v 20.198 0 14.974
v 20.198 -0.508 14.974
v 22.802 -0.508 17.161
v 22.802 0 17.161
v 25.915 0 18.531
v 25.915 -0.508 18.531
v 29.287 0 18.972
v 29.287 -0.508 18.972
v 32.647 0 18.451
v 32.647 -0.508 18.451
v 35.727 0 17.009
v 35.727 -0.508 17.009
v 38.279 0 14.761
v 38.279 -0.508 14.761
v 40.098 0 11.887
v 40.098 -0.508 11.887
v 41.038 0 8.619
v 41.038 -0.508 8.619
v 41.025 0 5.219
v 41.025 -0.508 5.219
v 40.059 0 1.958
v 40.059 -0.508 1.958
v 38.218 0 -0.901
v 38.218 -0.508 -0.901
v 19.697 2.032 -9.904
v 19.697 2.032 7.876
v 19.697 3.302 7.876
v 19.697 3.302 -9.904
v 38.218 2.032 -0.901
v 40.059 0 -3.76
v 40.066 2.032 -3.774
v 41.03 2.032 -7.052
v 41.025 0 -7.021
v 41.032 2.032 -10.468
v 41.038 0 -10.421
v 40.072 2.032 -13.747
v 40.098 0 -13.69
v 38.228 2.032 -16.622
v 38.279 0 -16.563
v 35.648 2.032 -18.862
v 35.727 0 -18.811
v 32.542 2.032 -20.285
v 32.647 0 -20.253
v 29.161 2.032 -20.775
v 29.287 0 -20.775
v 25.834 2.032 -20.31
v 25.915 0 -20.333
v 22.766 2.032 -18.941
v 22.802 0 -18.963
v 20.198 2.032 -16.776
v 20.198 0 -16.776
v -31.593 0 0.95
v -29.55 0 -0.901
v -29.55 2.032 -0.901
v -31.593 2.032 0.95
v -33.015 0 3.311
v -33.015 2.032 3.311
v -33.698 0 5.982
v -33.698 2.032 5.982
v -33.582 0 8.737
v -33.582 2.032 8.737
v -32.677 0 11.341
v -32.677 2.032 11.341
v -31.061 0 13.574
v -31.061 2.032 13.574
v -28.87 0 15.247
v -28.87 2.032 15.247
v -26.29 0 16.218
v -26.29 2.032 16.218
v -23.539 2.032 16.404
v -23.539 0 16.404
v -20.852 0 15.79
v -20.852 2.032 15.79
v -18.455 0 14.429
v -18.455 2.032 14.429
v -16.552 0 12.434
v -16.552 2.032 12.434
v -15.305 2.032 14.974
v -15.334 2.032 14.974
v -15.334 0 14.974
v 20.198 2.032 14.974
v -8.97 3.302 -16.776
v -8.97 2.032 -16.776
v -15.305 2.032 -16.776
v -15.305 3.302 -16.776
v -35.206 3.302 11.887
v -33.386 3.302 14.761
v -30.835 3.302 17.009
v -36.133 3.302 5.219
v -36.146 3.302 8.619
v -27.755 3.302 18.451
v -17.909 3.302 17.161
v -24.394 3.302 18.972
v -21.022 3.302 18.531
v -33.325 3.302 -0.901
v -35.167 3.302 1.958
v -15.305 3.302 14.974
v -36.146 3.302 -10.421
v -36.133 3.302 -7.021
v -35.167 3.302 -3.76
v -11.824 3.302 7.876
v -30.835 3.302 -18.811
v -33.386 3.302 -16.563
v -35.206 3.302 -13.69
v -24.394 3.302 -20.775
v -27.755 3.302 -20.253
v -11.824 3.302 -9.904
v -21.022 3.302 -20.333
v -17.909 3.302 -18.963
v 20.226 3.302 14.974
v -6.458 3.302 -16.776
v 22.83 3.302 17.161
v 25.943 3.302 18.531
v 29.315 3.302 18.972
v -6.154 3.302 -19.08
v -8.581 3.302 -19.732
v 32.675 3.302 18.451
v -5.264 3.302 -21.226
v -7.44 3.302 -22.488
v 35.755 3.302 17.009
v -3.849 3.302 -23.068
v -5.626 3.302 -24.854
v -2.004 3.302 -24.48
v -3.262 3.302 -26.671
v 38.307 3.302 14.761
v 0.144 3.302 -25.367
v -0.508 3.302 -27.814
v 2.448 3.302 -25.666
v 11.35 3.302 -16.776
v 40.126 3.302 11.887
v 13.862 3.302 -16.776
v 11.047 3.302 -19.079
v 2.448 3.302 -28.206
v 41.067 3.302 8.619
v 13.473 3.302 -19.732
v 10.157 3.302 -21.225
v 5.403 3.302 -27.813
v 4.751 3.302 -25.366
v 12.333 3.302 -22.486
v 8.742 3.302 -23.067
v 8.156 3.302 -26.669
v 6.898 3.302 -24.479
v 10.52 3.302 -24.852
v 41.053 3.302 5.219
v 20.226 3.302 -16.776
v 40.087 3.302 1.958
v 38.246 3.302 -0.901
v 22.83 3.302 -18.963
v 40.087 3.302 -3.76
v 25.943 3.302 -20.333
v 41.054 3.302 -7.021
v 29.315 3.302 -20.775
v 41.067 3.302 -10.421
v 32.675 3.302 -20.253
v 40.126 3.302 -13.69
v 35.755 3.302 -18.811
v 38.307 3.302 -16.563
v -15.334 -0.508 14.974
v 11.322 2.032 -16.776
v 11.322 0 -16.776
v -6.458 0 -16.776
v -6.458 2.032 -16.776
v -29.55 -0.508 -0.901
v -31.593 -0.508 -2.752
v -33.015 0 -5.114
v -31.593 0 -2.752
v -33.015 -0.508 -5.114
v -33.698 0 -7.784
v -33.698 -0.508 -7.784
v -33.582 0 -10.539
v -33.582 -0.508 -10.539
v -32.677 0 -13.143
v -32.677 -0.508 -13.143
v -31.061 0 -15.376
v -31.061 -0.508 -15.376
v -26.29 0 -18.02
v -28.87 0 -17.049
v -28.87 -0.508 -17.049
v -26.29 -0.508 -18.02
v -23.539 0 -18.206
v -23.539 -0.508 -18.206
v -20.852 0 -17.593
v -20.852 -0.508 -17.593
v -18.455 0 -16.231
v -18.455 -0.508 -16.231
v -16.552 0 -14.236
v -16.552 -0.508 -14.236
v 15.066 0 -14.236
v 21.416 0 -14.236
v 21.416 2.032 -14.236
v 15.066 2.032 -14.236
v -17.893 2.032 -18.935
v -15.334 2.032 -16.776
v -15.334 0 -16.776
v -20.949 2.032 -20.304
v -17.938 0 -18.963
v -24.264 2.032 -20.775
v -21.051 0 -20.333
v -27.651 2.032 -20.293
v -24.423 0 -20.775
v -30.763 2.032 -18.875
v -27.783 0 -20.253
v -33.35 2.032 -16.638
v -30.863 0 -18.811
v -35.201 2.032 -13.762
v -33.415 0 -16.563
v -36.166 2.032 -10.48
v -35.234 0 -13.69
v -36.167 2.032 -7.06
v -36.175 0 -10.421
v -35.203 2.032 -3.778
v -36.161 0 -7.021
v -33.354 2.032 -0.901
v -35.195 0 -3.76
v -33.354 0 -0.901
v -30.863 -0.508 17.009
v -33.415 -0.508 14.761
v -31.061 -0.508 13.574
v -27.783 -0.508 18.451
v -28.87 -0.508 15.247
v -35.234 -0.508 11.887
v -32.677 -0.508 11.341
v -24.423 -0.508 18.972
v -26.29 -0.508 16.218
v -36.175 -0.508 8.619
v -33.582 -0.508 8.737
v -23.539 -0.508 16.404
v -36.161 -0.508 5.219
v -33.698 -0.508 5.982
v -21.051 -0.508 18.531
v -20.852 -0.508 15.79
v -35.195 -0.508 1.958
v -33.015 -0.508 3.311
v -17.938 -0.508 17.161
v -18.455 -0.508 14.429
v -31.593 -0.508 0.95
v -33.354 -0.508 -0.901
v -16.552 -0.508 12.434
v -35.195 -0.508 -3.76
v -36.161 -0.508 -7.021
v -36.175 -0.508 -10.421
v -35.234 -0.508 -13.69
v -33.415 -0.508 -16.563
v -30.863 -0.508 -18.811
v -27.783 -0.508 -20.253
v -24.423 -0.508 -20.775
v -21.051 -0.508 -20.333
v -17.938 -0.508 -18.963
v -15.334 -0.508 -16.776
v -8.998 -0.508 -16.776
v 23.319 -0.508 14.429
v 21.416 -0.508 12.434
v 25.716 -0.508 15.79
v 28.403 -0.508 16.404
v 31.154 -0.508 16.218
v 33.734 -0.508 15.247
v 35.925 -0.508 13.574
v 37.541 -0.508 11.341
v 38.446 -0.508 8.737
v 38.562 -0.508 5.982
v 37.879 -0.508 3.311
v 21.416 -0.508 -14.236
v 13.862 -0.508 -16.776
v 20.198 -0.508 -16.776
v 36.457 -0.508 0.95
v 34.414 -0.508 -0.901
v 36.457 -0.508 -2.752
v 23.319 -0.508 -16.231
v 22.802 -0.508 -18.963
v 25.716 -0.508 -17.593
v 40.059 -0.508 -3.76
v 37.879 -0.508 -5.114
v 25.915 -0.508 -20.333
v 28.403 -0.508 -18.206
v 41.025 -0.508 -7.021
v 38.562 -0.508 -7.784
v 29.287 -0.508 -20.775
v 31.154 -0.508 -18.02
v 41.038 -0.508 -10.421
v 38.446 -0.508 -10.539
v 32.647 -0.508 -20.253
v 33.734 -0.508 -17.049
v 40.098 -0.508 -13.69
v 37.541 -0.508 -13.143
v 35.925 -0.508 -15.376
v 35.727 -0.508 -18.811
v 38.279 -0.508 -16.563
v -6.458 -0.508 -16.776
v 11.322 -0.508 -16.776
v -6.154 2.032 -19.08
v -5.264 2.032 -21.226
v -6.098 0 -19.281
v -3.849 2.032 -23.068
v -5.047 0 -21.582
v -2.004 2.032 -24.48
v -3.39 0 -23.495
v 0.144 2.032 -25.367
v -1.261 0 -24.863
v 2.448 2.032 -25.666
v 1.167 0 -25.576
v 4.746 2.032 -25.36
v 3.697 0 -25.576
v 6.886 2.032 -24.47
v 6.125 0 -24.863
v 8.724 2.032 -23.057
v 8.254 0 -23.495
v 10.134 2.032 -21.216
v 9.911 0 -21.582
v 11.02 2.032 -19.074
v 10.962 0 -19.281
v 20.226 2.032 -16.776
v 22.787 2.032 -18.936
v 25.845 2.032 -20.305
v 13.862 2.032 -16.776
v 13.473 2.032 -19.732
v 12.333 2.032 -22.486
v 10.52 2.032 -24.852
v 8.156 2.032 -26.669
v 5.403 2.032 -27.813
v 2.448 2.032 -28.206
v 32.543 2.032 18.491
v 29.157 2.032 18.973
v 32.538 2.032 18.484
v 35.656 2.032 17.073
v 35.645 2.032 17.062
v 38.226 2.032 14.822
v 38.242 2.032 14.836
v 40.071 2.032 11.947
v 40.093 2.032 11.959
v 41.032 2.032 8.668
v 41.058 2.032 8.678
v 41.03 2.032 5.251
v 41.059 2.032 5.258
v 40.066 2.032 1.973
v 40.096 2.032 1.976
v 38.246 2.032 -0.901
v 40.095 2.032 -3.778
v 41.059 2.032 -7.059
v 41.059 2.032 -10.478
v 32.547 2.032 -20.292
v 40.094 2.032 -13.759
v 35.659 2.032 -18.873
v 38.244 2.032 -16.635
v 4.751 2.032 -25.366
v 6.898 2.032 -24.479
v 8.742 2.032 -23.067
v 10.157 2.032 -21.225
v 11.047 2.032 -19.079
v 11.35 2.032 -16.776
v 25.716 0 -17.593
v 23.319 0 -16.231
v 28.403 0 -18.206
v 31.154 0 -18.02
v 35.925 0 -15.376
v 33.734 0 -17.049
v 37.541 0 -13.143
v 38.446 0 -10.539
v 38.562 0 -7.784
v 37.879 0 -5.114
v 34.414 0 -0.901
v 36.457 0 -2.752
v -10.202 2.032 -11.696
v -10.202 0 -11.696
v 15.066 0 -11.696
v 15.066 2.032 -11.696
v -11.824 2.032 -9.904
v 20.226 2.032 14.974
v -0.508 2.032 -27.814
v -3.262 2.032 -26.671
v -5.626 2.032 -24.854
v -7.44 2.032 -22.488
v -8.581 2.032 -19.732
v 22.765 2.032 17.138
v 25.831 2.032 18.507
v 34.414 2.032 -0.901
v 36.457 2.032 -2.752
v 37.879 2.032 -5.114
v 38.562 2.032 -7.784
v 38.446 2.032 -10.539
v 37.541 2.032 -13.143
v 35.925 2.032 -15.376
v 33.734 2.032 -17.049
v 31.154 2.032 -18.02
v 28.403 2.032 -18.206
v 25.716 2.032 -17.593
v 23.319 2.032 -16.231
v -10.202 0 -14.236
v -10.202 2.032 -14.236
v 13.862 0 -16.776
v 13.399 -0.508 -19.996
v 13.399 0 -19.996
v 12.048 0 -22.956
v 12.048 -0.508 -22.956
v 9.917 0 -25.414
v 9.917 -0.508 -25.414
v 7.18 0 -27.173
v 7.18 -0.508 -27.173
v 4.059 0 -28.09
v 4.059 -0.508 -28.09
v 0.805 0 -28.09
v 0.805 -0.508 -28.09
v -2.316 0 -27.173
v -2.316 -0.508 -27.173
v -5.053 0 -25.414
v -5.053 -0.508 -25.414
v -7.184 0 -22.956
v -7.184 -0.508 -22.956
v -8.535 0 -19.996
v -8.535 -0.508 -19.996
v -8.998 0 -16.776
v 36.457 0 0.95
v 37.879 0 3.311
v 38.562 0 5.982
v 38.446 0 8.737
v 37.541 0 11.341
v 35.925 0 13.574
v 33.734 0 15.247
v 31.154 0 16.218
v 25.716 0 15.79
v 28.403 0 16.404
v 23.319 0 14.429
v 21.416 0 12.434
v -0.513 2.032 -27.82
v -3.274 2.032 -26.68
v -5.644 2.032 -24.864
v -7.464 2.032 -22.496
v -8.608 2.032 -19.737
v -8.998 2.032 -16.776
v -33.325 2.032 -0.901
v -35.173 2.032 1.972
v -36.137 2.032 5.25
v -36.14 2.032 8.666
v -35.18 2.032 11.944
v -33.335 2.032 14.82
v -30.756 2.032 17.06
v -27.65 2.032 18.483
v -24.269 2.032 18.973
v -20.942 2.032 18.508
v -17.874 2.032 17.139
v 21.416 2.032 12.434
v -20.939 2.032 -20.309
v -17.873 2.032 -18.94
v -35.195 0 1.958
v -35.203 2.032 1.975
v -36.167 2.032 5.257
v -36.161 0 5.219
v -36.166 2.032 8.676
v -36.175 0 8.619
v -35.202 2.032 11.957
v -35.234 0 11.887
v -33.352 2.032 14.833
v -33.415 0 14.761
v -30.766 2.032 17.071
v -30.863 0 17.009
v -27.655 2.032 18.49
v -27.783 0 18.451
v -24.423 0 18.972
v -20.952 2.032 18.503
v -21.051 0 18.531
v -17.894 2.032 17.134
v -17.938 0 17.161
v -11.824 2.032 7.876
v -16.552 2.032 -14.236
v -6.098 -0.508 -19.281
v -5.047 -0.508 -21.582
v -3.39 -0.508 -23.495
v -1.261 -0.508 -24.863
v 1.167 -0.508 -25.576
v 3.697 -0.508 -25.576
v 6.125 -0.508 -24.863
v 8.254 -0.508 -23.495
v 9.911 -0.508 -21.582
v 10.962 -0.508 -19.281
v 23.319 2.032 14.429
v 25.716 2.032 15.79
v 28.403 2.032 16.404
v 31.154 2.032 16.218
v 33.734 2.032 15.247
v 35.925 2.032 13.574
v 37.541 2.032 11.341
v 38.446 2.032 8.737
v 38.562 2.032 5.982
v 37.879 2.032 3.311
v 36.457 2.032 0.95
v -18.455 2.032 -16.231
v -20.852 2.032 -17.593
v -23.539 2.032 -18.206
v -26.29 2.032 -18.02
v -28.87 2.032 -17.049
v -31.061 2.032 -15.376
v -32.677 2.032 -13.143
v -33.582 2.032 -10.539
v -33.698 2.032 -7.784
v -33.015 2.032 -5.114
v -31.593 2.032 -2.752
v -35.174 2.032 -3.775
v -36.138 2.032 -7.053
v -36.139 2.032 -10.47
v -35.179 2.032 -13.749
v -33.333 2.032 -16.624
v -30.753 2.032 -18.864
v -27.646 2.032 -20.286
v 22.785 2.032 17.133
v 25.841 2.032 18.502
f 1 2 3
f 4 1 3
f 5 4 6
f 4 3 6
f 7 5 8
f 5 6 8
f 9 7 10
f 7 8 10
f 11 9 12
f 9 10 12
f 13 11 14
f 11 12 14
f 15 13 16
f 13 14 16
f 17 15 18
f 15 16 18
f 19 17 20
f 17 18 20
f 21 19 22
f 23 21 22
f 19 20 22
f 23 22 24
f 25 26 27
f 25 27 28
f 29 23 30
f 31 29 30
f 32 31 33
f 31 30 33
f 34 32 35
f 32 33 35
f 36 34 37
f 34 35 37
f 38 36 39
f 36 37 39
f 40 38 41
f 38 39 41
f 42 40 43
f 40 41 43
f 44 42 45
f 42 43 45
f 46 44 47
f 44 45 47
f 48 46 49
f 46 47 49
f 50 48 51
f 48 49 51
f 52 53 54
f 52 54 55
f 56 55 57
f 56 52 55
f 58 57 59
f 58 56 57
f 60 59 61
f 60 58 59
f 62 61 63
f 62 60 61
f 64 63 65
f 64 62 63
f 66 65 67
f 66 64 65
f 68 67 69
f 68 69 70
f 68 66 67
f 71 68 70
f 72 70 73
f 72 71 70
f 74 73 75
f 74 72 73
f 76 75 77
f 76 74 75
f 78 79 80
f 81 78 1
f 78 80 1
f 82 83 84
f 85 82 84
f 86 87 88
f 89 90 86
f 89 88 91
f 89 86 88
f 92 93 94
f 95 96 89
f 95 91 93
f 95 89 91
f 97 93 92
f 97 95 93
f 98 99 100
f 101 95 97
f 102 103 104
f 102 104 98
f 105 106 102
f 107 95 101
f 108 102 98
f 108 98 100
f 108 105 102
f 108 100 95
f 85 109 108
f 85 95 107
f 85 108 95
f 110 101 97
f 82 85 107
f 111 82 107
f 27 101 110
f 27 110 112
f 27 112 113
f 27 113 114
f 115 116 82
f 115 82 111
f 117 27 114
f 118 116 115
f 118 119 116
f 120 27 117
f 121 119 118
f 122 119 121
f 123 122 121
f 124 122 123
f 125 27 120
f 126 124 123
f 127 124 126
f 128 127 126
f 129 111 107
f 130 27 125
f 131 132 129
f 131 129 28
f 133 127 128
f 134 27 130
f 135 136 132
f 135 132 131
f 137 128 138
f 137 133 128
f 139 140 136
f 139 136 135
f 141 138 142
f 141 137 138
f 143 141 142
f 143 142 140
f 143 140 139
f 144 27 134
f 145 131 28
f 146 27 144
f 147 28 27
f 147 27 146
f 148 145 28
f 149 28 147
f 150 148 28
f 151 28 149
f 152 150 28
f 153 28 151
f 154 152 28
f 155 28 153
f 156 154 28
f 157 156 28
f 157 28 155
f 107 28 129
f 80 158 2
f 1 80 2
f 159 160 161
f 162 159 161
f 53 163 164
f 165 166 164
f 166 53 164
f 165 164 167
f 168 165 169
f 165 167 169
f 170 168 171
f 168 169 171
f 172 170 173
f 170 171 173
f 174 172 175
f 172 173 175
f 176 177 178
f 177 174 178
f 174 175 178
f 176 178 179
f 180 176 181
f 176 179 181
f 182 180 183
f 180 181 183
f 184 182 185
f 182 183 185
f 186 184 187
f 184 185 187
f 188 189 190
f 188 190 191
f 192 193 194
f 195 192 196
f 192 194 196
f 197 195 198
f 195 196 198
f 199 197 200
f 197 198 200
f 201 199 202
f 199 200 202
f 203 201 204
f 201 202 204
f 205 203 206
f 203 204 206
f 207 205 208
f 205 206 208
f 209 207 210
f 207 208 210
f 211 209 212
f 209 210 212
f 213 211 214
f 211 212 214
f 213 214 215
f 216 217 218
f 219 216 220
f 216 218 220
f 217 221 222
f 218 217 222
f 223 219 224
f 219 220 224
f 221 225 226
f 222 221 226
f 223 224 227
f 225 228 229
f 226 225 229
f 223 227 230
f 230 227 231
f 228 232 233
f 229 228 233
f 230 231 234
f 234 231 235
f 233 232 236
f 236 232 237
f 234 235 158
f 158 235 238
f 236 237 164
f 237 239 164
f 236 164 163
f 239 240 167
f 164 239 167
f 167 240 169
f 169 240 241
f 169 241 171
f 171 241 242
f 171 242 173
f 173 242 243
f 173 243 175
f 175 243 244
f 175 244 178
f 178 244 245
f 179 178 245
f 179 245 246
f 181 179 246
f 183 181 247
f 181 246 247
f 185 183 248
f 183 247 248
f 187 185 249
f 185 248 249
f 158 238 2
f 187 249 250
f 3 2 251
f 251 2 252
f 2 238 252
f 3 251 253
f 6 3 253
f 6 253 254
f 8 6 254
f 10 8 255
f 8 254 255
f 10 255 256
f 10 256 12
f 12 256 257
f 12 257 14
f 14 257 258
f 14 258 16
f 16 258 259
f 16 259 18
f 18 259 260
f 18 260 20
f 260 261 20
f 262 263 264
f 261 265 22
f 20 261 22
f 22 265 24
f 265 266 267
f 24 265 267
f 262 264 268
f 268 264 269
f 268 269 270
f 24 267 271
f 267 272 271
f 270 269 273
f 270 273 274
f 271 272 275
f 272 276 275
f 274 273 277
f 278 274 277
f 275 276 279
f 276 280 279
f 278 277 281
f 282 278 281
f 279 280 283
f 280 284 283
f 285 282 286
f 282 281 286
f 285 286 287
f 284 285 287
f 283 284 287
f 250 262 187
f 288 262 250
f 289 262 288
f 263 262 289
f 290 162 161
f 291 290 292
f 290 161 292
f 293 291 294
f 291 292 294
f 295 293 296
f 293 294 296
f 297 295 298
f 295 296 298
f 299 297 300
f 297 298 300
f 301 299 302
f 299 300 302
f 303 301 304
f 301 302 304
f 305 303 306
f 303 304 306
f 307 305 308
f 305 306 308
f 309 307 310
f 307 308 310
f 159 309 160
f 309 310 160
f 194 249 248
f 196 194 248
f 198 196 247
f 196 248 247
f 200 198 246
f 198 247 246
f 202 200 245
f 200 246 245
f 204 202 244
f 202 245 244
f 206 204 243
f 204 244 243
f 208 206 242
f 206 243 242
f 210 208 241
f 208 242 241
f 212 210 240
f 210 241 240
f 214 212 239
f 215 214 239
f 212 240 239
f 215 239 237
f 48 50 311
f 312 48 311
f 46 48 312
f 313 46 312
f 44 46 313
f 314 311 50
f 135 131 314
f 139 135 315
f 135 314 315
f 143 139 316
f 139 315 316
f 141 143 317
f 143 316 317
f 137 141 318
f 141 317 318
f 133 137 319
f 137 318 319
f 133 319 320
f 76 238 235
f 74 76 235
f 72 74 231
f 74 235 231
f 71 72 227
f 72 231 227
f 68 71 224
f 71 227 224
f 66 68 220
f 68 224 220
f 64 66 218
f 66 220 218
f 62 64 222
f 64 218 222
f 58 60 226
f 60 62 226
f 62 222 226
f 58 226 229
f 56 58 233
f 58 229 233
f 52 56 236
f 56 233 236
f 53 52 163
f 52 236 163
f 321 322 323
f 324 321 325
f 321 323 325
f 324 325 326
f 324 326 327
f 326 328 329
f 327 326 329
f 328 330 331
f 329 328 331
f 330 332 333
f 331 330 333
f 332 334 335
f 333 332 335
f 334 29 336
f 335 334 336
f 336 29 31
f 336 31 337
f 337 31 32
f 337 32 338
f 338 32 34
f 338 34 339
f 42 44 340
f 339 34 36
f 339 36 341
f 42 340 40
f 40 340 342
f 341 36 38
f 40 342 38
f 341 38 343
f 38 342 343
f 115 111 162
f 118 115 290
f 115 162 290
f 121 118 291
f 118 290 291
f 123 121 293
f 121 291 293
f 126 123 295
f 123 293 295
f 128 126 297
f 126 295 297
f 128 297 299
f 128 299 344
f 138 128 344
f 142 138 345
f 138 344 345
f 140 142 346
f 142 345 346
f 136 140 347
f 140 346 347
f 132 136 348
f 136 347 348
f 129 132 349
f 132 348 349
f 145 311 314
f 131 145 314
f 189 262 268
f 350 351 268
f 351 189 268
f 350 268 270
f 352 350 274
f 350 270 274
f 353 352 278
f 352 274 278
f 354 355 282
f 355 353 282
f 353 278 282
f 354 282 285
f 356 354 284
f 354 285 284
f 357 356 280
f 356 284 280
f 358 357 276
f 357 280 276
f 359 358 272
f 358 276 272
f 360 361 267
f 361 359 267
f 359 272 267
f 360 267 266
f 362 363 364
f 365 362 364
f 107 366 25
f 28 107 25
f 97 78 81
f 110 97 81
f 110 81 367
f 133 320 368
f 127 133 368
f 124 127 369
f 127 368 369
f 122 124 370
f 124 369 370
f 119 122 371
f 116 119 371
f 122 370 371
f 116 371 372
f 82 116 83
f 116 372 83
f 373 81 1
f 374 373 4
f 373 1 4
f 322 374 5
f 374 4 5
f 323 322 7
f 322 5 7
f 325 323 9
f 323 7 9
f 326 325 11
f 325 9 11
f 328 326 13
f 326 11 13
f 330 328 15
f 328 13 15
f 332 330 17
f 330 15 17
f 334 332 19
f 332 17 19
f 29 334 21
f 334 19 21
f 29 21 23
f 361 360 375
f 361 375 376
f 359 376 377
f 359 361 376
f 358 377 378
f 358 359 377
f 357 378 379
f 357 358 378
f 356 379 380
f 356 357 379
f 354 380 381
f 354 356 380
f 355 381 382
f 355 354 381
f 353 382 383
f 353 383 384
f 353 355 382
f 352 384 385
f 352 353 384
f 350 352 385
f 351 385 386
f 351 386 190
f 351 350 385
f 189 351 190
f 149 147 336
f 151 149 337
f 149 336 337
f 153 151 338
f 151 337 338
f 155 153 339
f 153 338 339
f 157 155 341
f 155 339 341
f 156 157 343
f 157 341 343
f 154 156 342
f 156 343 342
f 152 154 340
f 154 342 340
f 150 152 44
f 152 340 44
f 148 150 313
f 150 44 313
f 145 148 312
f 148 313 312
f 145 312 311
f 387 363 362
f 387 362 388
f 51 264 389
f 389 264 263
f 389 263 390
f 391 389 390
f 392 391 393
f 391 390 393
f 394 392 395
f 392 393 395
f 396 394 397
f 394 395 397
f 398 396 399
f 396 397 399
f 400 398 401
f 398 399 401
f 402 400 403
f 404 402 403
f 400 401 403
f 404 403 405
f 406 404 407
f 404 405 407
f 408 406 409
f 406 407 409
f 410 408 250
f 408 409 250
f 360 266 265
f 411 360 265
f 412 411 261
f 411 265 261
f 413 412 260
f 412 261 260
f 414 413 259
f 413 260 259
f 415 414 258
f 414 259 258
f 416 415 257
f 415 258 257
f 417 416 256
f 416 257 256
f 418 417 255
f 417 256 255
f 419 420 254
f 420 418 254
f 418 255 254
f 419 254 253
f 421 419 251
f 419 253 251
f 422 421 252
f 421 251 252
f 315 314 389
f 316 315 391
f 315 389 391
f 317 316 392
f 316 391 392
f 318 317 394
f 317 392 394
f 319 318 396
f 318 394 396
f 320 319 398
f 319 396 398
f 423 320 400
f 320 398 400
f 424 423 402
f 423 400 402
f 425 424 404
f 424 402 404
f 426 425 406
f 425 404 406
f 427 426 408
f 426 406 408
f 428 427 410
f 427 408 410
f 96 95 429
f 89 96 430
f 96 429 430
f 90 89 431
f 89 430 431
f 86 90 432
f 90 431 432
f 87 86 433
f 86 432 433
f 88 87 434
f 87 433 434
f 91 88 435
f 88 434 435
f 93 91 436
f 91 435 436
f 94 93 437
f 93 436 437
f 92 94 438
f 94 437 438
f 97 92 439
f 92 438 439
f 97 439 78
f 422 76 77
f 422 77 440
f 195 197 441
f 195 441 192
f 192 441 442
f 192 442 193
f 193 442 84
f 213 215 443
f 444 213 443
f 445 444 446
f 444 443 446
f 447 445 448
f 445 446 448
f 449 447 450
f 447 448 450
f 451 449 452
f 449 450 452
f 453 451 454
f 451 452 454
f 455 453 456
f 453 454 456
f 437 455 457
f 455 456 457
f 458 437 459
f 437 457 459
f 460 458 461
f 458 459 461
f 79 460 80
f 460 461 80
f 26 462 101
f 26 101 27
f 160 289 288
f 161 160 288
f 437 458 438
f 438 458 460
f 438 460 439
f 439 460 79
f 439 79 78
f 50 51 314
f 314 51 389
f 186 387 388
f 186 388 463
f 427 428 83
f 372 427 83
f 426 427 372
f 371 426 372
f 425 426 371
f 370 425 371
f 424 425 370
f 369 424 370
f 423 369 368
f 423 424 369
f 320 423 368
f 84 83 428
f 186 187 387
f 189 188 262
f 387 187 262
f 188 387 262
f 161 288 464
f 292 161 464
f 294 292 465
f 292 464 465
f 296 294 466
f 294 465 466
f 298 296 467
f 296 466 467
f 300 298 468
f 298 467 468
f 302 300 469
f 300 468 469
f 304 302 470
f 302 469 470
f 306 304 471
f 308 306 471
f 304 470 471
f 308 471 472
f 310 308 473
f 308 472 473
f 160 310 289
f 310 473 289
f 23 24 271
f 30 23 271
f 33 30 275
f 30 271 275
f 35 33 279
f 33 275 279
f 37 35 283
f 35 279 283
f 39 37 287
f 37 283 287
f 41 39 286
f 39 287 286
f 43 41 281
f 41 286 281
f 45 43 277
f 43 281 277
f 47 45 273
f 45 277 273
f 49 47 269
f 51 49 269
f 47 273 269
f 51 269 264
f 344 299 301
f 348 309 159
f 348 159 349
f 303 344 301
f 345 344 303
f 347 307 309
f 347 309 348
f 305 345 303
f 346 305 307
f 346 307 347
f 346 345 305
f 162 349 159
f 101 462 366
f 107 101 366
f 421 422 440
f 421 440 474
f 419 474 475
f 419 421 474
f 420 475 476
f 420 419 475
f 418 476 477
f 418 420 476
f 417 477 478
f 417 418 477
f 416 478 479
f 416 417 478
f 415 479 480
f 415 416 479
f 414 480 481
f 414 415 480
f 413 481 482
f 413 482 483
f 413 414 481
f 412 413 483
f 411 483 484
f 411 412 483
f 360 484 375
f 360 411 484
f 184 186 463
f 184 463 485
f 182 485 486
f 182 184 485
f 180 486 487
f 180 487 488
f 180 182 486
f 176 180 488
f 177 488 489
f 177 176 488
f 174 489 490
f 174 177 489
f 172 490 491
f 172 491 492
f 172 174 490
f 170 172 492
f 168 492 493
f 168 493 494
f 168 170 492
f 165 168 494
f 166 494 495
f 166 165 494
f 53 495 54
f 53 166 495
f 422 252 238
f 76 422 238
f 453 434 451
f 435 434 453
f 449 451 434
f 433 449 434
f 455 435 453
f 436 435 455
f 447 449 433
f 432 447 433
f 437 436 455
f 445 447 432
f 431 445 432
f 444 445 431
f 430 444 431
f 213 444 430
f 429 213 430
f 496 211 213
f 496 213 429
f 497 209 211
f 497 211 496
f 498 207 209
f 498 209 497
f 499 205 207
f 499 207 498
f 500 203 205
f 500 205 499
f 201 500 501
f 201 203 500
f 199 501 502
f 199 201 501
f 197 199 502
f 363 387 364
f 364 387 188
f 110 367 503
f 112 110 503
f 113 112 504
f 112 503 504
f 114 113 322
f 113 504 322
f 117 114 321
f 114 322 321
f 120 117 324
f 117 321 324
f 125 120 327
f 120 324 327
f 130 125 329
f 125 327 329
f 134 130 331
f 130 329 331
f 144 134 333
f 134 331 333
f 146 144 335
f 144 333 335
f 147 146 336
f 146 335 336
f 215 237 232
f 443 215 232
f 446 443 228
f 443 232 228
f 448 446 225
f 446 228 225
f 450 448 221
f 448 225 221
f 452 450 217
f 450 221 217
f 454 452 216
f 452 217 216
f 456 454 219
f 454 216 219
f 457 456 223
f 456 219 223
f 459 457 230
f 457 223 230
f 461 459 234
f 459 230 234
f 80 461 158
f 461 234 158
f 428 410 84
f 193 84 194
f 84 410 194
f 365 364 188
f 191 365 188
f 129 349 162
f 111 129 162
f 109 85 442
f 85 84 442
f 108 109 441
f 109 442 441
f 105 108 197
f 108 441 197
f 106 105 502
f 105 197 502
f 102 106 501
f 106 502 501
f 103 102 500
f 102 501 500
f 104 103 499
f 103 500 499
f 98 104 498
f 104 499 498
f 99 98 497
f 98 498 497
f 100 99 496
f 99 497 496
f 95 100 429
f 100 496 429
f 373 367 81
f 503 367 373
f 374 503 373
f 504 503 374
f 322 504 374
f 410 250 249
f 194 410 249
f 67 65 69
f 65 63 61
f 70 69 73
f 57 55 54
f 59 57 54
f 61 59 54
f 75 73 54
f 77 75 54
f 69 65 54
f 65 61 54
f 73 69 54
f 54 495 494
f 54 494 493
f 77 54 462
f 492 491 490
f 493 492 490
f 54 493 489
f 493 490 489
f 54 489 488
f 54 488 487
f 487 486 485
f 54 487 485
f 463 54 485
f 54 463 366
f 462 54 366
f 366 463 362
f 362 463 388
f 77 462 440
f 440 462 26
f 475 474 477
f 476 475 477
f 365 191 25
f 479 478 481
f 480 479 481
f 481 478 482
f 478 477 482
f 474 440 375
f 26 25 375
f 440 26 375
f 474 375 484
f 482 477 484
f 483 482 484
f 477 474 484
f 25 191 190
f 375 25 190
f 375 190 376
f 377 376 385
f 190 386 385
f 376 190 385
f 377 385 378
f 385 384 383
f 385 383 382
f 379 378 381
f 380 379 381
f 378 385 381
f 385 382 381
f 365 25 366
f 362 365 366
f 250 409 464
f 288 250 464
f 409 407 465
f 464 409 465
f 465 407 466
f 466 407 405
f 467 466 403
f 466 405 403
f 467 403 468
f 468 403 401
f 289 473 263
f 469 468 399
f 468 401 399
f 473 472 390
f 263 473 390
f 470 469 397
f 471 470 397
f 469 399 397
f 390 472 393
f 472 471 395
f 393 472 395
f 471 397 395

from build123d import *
from build123d.topology import SkipClean

# Parameters (mm, degrees)
SKETCH1_W               = 25.267998505
SKETCH1_H               = 2.54
BOSS_EXTRUDE4_DEPTH     = 2.032
BOSS_EXTRUDE7_OUTLINE_W = 31.52140002
BOSS_EXTRUDE7_OUTLINE_H = 17.78
BOSS_EXTRUDE7_DEPTH     = 1.27
BOSS_EXTRUDE8_START     = -0.508
BOSS_EXTRUDE8_DEPTH     = 0.508


# Read off the part's stored shape, not the designer's step: Boss-Extrude7
with BuildPart() as part:
    # Sketch1 → Boss-Extrude4 (new body)
    # profile 1 of 3: a face of its own
    with BuildSketch(Plane(origin=(0, 0, 0), x_dir=(1, 0, 0), z_dir=(0, 1, 0))):
        with BuildLine():
            ThreePointArc((20.197665706, -14.97393985), (37.082685983, -15.975529809), (38.217517737, 0.901058978))
            ThreePointArc((38.217517737, 0.901058978), (37.082688311, 17.777649884), (20.197665941, 16.776062133))
            Line((20.197665941, 16.776062133), (-15.333719311, 16.776062133))
            ThreePointArc((-15.333719311, 16.776062133), (-32.218740701, 17.777648898), (-33.353569348, 0.901058978))
            ThreePointArc((-33.353569348, 0.901058978), (-32.218738374, -15.975528824), (-15.333719076, -14.97393985))
            Line((-15.333719076, -14.97393985), (20.197665706, -14.97393985))
        make_face()
        with BuildLine():
            ThreePointArc((-29.55002508, 0.901059234), (-31.060989267, -13.57397761), (-16.552025889, -12.43393985))
            Line((-16.552025889, -12.43393985), (21.415972616, -12.43393985))
            ThreePointArc((21.415972616, -12.43393985), (35.924936864, -13.573978674), (34.413973715, 0.901059234))
            ThreePointArc((34.413973715, 0.901059234), (35.924938934, 15.376098834), (21.415972616, 14.236062133))
            Line((21.415972616, 14.236062133), (-16.552025889, 14.236062133))
            ThreePointArc((-16.552025889, 14.236062133), (-31.060991337, 15.376097769), (-29.55002508, 0.901059234))
        make_face(mode=Mode.SUBTRACT)
    # profile 2 of 3: a face of its own
    with BuildSketch(Plane(origin=(0, 0, 0), x_dir=(1, 0, 0), z_dir=(0, 1, 0))):
        with Locations((2.431973364, 12.966062133)):
            Rectangle(SKETCH1_W, SKETCH1_H)
    # profile 3 of 3: a face of its own
    with BuildSketch(Plane(origin=(0, 0, 0), x_dir=(1, 0, 0), z_dir=(0, 1, 0))):
        with BuildLine():
            Line((11.321973315, 16.776062133), (13.861973315, 16.776062133))
            ThreePointArc((13.861973315, 16.776062133), (2.431973315, 28.206062133), (-8.998026685, 16.776062133))
            Line((-8.998026685, 16.776062133), (-6.458026685, 16.776062133))
            ThreePointArc((-6.458026685, 16.776062133), (2.431973315, 25.666062133), (11.321973315, 16.776062133))
        make_face()
    extrude(amount=BOSS_EXTRUDE4_DEPTH)

    # Boss-Extrude7 outline → Boss-Extrude7 (add)
    with BuildSketch(Plane(origin=(0, 2.032, 0), x_dir=(1, 0, 0), z_dir=(0, 1, 0))):
        with BuildLine():
            Line((20.225964487, 16.776056529), (13.861973315, 16.776062133))
            ThreePointArc((13.861973315, 16.776062133), (10.520004553, 24.852487746), (2.448386143, 28.206050349))
            ThreePointArc((2.448386143, 28.206050349), (-5.626159792, 24.854083709), (-8.969728139, 16.776056529))
            Line((-8.969728139, 16.776056529), (-15.305420765, 16.776056529))
            ThreePointArc((-15.305420765, 16.776056529), (-32.190442155, 17.777643295), (-33.325270802, 0.901053374))
            ThreePointArc((-33.325270802, 0.901053374), (-32.190437006, -15.975536914), (-15.305415514, -14.97393985))
            Line((-15.305415514, -14.97393985), (20.225964252, -14.973945454))
            ThreePointArc((20.225964252, -14.973945454), (37.110984529, -15.975535414), (38.245816283, 0.901053374))
            ThreePointArc((38.245816283, 0.901053374), (37.110986856, 17.77764428), (20.225964487, 16.776056529))
        make_face()
        with Locations((3.936415724, 1.014356422)):
            Rectangle(BOSS_EXTRUDE7_OUTLINE_W, BOSS_EXTRUDE7_OUTLINE_H, mode=Mode.SUBTRACT)
        with BuildLine():
            Line((11.350271861, 16.776056529), (-6.458026685, 16.776062133))
            ThreePointArc((-6.458026685, 16.776062133), (-3.848578482, 23.067863872), (2.44788313, 25.666047897))
            ThreePointArc((2.44788313, 25.666047897), (8.742069541, 23.066614366), (11.350271861, 16.776056529))
        make_face(mode=Mode.SUBTRACT)
    extrude(amount=BOSS_EXTRUDE7_DEPTH)

    # Sketch4 → Boss-Extrude8 (add)
    # profile 1 of 2: a face of its own
    with SkipClean():  # the faces are left unmerged after this step: merging them gives an invalid solid
        with BuildSketch(Plane(origin=(0, 0, 0), x_dir=(1, 0, 0), z_dir=(0, 1, 0)).offset(BOSS_EXTRUDE8_START)):
            with BuildLine():
                ThreePointArc((-33.353569348, 0.901058978), (-32.218738374, -15.975528824), (-15.333719076, -14.97393985))
                Line((-15.333719076, -14.97393985), (20.197665706, -14.97393985))
                ThreePointArc((20.197665706, -14.97393985), (37.082685983, -15.975529809), (38.217517737, 0.901058978))
                ThreePointArc((38.217517737, 0.901058978), (37.082688311, 17.777649884), (20.197665941, 16.776062133))
                Line((20.197665941, 16.776062133), (13.861973315, 16.776062133))
                Line((13.861973315, 16.776062133), (11.321973315, 16.776062133))
                Line((11.321973315, 16.776062133), (-6.458026685, 16.776062133))
                Line((-6.458026685, 16.776062133), (-8.998026685, 16.776062133))
                Line((-8.998026685, 16.776062133), (-15.333719311, 16.776062133))
                ThreePointArc((-15.333719311, 16.776062133), (-32.218740701, 17.777648898), (-33.353569348, 0.901058978))
            make_face()
            with BuildLine():
                Line((21.415972616, -12.43393985), (-16.552025889, -12.43393985))
                ThreePointArc((-16.552025889, -12.43393985), (-31.060989267, -13.57397761), (-29.55002508, 0.901059234))
                ThreePointArc((-29.55002508, 0.901059234), (-31.060991337, 15.376097769), (-16.552025889, 14.236062133))
                Line((-16.552025889, 14.236062133), (-10.202025889, 14.236062133))
                Line((-10.202025889, 14.236062133), (15.065972616, 14.236062133))
                Line((15.065972616, 14.236062133), (21.415972616, 14.236062133))
                ThreePointArc((21.415972616, 14.236062133), (35.924938934, 15.376098834), (34.413973715, 0.901059234))
                ThreePointArc((34.413973715, 0.901059234), (35.924936864, -13.573978674), (21.415972616, -12.43393985))
            make_face(mode=Mode.SUBTRACT)
        # profile 2 of 2: a face of its own
        with BuildSketch(Plane(origin=(0, 0, 0), x_dir=(1, 0, 0), z_dir=(0, 1, 0)).offset(BOSS_EXTRUDE8_START)):
            with BuildLine():
                ThreePointArc((13.861973315, 16.776062133), (2.431973315, 28.206062133), (-8.998026685, 16.776062133))
                Line((-8.998026685, 16.776062133), (-6.458026685, 16.776062133))
                ThreePointArc((-6.458026685, 16.776062133), (2.431973315, 25.666062133), (11.321973315, 16.776062133))
                Line((11.321973315, 16.776062133), (13.861973315, 16.776062133))
            make_face()
        extrude(amount=BOSS_EXTRUDE8_DEPTH)


solid = part.part
